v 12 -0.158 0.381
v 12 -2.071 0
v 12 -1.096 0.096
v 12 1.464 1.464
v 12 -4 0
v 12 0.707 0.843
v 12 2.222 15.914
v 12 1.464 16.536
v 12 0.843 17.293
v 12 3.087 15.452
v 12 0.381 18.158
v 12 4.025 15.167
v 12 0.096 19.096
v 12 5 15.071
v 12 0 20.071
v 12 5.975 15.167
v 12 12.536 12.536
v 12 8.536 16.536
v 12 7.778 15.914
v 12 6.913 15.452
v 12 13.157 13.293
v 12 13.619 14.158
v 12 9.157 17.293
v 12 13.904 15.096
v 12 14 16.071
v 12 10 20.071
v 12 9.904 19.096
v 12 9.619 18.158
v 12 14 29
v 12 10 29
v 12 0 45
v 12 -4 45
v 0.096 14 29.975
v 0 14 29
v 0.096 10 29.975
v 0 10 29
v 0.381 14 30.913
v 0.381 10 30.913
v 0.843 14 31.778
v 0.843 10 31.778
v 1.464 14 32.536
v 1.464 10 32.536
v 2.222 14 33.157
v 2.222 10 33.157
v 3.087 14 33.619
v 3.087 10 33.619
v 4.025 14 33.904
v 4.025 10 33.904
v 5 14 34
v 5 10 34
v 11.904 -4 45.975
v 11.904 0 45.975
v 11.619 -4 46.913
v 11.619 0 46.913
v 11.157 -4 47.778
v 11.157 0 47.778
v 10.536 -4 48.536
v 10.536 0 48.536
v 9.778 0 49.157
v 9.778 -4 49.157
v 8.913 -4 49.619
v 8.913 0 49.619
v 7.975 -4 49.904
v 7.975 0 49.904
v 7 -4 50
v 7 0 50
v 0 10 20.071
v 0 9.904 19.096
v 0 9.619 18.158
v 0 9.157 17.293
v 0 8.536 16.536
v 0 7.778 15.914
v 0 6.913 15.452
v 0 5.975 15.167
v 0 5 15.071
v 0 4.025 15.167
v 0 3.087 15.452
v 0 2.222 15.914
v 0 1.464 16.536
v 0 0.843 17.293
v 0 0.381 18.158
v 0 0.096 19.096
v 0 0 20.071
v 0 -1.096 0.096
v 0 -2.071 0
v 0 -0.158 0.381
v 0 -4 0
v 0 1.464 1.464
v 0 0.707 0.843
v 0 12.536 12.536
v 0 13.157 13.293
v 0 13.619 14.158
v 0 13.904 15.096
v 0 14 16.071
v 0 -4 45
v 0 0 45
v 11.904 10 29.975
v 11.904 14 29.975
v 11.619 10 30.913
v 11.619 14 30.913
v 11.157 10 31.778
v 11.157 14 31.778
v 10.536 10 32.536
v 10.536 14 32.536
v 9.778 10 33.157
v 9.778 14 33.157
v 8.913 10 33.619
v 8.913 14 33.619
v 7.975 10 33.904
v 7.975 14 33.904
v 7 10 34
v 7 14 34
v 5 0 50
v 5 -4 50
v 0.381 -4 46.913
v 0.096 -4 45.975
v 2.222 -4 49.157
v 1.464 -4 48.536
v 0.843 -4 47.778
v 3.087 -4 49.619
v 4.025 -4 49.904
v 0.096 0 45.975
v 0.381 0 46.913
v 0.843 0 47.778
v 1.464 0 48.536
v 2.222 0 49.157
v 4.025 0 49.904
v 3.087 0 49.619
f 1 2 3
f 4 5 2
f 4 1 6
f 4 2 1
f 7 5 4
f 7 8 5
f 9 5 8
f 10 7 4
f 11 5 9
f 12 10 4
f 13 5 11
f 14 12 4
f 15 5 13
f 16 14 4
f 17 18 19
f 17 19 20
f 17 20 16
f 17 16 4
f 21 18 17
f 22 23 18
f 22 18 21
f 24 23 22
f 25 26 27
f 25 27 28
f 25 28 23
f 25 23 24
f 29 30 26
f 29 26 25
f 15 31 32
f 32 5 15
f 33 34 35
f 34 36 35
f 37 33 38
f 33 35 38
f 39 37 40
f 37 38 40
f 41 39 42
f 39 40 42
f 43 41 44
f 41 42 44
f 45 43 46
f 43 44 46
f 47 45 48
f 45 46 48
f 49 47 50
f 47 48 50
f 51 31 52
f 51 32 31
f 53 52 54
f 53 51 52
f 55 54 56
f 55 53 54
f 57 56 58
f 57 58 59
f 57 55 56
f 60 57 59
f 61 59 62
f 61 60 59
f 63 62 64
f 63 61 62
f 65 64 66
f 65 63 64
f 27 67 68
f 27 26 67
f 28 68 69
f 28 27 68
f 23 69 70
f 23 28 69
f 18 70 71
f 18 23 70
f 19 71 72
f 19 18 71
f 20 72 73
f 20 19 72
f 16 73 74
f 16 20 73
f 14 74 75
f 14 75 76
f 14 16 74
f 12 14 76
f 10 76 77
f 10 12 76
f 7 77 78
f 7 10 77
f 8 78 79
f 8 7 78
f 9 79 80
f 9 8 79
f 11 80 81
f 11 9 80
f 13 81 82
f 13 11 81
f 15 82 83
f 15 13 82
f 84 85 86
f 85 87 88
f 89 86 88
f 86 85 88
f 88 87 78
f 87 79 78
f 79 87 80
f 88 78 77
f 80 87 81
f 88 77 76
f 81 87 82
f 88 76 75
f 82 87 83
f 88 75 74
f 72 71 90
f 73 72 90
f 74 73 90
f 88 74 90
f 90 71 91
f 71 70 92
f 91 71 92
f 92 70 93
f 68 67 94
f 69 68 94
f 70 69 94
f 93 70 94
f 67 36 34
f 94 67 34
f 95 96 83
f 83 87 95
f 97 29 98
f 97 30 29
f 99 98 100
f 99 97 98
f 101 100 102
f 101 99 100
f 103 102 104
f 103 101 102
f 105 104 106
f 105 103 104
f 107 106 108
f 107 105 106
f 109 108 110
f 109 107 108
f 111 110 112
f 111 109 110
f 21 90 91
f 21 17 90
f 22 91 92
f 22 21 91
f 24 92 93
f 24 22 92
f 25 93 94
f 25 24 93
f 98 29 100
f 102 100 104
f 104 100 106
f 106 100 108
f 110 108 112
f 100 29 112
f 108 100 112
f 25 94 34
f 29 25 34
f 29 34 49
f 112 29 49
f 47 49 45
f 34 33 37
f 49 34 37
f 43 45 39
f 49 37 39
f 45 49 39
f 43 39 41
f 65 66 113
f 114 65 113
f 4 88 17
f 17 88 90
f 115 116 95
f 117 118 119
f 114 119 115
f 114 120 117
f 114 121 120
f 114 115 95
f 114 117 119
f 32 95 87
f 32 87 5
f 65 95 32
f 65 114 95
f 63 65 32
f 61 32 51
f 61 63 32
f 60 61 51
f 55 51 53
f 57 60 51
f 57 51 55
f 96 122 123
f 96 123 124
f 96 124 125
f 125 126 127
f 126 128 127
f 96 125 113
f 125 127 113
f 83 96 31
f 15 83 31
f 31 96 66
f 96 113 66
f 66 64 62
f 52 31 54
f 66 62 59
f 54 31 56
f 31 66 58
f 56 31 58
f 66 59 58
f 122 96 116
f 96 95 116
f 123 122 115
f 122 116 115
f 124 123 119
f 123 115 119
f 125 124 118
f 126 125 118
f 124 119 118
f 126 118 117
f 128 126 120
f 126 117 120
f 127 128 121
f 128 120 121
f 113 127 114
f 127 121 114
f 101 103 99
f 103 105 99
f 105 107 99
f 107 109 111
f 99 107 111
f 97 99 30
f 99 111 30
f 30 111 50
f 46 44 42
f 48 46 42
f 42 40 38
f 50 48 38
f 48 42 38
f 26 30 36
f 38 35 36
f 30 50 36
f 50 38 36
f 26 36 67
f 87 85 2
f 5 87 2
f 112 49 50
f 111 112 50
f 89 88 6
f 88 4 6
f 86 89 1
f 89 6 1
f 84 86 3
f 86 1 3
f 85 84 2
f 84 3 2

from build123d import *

# Parameters (mm, degrees)
F0_W     = 6
F0_H     = 50
F1_DEPTH = 4
F3_DEPTH = 12
F4_R     = 4.99999
F5_R     = 5


# Not quite as in the source:
# - a fillet or chamfer is up to 0.001 mm smaller than in the source, because OpenCascade refuses the exact size


with BuildPart() as f1:
    # F0 (on Front) → F1 (new body)
    with BuildSketch(Plane.XZ):
        with Locations((9, 25)):
            Rectangle(F0_W, F0_H)
        with Locations((3, 25)):
            Rectangle(F0_W, F0_H)
    extrude(amount=F1_DEPTH)

    # F2 (on Right) → F3 (join)
    with BuildSketch(Plane.YZ):
        Polygon((0, 8), (0, 0), (14, 14), (14, 34), (10, 34), (10, 18), align=None)
    extrude(amount=F3_DEPTH)

    # F4 (radius 5 in the source; OpenCascade refuses exactly that, so slightly less here)
    f4_edges = [f1.edges().sort_by_distance(p)[0] for p in [
        (0, -2, 50),
        (12, -2, 50),
        (0, 12, 34),
        (12, 12, 34),
        (6, 10, 18),
        (6, 14, 14),
        (6, 0, 8),
    ]]
    fillet(f4_edges, radius=F4_R)

    # F5
    f5_edges = [f1.edges().sort_by_distance(p)[0] for p in [
        (6, 0, 0),
    ]]
    fillet(f5_edges, radius=F5_R)


solid = f1.part
